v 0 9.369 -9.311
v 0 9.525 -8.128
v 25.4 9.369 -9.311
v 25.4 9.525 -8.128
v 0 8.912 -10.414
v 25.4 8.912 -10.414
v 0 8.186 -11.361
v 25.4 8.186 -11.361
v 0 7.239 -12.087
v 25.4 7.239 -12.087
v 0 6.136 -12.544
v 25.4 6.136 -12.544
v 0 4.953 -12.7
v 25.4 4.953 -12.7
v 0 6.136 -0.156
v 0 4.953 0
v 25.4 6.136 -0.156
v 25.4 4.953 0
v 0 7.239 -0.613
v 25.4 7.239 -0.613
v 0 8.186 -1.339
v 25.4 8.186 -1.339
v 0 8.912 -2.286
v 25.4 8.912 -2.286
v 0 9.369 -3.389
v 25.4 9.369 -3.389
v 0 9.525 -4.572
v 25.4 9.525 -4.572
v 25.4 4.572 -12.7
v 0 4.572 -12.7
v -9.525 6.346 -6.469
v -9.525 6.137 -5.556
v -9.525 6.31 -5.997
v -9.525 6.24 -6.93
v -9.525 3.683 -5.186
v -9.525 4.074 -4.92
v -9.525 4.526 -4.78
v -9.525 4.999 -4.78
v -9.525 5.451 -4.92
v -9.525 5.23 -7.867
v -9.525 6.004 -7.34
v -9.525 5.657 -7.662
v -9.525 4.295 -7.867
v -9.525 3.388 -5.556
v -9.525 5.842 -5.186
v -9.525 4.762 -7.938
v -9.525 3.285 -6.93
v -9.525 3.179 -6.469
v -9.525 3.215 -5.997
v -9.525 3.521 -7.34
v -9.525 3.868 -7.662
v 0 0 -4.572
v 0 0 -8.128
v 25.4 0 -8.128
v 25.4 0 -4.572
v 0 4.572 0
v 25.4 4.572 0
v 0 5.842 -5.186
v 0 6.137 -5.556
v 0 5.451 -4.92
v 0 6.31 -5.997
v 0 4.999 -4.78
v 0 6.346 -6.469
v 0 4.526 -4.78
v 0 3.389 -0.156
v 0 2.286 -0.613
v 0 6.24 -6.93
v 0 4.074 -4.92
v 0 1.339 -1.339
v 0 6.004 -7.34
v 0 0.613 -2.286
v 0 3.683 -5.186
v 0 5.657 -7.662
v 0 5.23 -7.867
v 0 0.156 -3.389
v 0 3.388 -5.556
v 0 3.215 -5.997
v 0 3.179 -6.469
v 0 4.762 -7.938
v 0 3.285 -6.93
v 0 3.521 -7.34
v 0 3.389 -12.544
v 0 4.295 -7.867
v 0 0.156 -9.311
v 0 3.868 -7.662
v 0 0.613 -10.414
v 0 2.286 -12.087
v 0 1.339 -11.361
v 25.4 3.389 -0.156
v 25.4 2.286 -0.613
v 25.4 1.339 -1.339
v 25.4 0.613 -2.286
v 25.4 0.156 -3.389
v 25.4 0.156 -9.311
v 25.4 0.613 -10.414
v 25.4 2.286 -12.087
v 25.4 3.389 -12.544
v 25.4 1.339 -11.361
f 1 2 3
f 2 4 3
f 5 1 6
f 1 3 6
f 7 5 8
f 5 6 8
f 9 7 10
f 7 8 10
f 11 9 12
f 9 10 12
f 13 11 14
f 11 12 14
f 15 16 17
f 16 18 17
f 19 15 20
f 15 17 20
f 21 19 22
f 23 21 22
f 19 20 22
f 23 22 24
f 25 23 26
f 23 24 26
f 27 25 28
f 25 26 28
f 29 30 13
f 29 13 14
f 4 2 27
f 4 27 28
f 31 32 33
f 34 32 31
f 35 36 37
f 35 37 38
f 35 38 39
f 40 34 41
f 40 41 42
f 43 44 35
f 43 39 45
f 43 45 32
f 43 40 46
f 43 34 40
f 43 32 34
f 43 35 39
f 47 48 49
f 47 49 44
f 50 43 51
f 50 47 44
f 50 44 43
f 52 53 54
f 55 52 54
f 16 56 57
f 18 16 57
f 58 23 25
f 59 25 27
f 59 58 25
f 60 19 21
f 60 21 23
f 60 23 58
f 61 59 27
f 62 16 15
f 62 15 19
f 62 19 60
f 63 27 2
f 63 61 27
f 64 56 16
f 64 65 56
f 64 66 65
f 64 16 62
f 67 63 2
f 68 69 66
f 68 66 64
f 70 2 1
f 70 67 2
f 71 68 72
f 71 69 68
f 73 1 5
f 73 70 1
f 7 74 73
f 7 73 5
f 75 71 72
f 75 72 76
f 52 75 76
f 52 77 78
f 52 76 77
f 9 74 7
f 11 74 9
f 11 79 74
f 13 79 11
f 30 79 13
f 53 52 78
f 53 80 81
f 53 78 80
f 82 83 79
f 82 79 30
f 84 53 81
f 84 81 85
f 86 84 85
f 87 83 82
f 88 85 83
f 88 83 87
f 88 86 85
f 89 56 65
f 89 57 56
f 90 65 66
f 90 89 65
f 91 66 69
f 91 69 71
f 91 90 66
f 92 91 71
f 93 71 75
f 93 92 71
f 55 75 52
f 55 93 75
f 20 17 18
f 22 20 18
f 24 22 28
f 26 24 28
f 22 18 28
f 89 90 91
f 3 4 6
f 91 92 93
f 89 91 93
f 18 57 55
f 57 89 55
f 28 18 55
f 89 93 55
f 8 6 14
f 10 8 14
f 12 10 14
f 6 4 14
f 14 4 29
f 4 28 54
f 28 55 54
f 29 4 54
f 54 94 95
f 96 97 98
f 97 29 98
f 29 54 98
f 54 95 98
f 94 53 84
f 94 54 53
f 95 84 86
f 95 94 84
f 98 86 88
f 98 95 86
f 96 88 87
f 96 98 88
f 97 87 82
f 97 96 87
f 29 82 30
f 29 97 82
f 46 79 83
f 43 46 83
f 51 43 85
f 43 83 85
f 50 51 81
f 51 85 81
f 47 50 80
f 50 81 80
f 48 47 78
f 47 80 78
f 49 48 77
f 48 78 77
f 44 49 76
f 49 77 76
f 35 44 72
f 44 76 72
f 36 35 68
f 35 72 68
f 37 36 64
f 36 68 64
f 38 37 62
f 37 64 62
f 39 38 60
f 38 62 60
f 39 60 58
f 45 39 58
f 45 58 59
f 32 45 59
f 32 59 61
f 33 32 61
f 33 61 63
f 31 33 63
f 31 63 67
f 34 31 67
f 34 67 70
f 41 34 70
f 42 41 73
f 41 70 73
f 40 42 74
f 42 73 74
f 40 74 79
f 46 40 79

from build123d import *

# Parameters (mm, degrees)
SKETCH1_W           = 25.4
SKETCH1_H           = 12.7
BOSS_EXTRUDE1_DEPTH = 9.525
SKETCH2_R           = 1.5875
BOSS_EXTRUDE2_DEPTH = 9.525
FILLET1_R           = 4.572


with BuildPart() as part:
    # Sketch1 → Boss-Extrude1 (new body)
    with BuildSketch(Plane(origin=(0, 0, 0), x_dir=(1, 0, 0), z_dir=(0, 1, 0))):
        with Locations((12.7, 6.35)):
            Rectangle(SKETCH1_W, SKETCH1_H)
    extrude(amount=BOSS_EXTRUDE1_DEPTH)

    # Sketch2 → Boss-Extrude2 (add)
    with BuildSketch(Plane.ZY):
        with Locations(Location((-6.35, 4.7625, 0), (0, 0, 180))):
            Circle(SKETCH2_R)
    extrude(amount=BOSS_EXTRUDE2_DEPTH)

    # Fillet1
    fillet1_edges = [part.edges().sort_by_distance(p)[0] for p in [
        (12.7, 9.525, -12.7),
        (12.7, 0, -12.7),
        (12.7, 0, 0),
        (12.7, 9.525, 0),
    ]]
    fillet(fillet1_edges, radius=FILLET1_R)


solid = part.part
